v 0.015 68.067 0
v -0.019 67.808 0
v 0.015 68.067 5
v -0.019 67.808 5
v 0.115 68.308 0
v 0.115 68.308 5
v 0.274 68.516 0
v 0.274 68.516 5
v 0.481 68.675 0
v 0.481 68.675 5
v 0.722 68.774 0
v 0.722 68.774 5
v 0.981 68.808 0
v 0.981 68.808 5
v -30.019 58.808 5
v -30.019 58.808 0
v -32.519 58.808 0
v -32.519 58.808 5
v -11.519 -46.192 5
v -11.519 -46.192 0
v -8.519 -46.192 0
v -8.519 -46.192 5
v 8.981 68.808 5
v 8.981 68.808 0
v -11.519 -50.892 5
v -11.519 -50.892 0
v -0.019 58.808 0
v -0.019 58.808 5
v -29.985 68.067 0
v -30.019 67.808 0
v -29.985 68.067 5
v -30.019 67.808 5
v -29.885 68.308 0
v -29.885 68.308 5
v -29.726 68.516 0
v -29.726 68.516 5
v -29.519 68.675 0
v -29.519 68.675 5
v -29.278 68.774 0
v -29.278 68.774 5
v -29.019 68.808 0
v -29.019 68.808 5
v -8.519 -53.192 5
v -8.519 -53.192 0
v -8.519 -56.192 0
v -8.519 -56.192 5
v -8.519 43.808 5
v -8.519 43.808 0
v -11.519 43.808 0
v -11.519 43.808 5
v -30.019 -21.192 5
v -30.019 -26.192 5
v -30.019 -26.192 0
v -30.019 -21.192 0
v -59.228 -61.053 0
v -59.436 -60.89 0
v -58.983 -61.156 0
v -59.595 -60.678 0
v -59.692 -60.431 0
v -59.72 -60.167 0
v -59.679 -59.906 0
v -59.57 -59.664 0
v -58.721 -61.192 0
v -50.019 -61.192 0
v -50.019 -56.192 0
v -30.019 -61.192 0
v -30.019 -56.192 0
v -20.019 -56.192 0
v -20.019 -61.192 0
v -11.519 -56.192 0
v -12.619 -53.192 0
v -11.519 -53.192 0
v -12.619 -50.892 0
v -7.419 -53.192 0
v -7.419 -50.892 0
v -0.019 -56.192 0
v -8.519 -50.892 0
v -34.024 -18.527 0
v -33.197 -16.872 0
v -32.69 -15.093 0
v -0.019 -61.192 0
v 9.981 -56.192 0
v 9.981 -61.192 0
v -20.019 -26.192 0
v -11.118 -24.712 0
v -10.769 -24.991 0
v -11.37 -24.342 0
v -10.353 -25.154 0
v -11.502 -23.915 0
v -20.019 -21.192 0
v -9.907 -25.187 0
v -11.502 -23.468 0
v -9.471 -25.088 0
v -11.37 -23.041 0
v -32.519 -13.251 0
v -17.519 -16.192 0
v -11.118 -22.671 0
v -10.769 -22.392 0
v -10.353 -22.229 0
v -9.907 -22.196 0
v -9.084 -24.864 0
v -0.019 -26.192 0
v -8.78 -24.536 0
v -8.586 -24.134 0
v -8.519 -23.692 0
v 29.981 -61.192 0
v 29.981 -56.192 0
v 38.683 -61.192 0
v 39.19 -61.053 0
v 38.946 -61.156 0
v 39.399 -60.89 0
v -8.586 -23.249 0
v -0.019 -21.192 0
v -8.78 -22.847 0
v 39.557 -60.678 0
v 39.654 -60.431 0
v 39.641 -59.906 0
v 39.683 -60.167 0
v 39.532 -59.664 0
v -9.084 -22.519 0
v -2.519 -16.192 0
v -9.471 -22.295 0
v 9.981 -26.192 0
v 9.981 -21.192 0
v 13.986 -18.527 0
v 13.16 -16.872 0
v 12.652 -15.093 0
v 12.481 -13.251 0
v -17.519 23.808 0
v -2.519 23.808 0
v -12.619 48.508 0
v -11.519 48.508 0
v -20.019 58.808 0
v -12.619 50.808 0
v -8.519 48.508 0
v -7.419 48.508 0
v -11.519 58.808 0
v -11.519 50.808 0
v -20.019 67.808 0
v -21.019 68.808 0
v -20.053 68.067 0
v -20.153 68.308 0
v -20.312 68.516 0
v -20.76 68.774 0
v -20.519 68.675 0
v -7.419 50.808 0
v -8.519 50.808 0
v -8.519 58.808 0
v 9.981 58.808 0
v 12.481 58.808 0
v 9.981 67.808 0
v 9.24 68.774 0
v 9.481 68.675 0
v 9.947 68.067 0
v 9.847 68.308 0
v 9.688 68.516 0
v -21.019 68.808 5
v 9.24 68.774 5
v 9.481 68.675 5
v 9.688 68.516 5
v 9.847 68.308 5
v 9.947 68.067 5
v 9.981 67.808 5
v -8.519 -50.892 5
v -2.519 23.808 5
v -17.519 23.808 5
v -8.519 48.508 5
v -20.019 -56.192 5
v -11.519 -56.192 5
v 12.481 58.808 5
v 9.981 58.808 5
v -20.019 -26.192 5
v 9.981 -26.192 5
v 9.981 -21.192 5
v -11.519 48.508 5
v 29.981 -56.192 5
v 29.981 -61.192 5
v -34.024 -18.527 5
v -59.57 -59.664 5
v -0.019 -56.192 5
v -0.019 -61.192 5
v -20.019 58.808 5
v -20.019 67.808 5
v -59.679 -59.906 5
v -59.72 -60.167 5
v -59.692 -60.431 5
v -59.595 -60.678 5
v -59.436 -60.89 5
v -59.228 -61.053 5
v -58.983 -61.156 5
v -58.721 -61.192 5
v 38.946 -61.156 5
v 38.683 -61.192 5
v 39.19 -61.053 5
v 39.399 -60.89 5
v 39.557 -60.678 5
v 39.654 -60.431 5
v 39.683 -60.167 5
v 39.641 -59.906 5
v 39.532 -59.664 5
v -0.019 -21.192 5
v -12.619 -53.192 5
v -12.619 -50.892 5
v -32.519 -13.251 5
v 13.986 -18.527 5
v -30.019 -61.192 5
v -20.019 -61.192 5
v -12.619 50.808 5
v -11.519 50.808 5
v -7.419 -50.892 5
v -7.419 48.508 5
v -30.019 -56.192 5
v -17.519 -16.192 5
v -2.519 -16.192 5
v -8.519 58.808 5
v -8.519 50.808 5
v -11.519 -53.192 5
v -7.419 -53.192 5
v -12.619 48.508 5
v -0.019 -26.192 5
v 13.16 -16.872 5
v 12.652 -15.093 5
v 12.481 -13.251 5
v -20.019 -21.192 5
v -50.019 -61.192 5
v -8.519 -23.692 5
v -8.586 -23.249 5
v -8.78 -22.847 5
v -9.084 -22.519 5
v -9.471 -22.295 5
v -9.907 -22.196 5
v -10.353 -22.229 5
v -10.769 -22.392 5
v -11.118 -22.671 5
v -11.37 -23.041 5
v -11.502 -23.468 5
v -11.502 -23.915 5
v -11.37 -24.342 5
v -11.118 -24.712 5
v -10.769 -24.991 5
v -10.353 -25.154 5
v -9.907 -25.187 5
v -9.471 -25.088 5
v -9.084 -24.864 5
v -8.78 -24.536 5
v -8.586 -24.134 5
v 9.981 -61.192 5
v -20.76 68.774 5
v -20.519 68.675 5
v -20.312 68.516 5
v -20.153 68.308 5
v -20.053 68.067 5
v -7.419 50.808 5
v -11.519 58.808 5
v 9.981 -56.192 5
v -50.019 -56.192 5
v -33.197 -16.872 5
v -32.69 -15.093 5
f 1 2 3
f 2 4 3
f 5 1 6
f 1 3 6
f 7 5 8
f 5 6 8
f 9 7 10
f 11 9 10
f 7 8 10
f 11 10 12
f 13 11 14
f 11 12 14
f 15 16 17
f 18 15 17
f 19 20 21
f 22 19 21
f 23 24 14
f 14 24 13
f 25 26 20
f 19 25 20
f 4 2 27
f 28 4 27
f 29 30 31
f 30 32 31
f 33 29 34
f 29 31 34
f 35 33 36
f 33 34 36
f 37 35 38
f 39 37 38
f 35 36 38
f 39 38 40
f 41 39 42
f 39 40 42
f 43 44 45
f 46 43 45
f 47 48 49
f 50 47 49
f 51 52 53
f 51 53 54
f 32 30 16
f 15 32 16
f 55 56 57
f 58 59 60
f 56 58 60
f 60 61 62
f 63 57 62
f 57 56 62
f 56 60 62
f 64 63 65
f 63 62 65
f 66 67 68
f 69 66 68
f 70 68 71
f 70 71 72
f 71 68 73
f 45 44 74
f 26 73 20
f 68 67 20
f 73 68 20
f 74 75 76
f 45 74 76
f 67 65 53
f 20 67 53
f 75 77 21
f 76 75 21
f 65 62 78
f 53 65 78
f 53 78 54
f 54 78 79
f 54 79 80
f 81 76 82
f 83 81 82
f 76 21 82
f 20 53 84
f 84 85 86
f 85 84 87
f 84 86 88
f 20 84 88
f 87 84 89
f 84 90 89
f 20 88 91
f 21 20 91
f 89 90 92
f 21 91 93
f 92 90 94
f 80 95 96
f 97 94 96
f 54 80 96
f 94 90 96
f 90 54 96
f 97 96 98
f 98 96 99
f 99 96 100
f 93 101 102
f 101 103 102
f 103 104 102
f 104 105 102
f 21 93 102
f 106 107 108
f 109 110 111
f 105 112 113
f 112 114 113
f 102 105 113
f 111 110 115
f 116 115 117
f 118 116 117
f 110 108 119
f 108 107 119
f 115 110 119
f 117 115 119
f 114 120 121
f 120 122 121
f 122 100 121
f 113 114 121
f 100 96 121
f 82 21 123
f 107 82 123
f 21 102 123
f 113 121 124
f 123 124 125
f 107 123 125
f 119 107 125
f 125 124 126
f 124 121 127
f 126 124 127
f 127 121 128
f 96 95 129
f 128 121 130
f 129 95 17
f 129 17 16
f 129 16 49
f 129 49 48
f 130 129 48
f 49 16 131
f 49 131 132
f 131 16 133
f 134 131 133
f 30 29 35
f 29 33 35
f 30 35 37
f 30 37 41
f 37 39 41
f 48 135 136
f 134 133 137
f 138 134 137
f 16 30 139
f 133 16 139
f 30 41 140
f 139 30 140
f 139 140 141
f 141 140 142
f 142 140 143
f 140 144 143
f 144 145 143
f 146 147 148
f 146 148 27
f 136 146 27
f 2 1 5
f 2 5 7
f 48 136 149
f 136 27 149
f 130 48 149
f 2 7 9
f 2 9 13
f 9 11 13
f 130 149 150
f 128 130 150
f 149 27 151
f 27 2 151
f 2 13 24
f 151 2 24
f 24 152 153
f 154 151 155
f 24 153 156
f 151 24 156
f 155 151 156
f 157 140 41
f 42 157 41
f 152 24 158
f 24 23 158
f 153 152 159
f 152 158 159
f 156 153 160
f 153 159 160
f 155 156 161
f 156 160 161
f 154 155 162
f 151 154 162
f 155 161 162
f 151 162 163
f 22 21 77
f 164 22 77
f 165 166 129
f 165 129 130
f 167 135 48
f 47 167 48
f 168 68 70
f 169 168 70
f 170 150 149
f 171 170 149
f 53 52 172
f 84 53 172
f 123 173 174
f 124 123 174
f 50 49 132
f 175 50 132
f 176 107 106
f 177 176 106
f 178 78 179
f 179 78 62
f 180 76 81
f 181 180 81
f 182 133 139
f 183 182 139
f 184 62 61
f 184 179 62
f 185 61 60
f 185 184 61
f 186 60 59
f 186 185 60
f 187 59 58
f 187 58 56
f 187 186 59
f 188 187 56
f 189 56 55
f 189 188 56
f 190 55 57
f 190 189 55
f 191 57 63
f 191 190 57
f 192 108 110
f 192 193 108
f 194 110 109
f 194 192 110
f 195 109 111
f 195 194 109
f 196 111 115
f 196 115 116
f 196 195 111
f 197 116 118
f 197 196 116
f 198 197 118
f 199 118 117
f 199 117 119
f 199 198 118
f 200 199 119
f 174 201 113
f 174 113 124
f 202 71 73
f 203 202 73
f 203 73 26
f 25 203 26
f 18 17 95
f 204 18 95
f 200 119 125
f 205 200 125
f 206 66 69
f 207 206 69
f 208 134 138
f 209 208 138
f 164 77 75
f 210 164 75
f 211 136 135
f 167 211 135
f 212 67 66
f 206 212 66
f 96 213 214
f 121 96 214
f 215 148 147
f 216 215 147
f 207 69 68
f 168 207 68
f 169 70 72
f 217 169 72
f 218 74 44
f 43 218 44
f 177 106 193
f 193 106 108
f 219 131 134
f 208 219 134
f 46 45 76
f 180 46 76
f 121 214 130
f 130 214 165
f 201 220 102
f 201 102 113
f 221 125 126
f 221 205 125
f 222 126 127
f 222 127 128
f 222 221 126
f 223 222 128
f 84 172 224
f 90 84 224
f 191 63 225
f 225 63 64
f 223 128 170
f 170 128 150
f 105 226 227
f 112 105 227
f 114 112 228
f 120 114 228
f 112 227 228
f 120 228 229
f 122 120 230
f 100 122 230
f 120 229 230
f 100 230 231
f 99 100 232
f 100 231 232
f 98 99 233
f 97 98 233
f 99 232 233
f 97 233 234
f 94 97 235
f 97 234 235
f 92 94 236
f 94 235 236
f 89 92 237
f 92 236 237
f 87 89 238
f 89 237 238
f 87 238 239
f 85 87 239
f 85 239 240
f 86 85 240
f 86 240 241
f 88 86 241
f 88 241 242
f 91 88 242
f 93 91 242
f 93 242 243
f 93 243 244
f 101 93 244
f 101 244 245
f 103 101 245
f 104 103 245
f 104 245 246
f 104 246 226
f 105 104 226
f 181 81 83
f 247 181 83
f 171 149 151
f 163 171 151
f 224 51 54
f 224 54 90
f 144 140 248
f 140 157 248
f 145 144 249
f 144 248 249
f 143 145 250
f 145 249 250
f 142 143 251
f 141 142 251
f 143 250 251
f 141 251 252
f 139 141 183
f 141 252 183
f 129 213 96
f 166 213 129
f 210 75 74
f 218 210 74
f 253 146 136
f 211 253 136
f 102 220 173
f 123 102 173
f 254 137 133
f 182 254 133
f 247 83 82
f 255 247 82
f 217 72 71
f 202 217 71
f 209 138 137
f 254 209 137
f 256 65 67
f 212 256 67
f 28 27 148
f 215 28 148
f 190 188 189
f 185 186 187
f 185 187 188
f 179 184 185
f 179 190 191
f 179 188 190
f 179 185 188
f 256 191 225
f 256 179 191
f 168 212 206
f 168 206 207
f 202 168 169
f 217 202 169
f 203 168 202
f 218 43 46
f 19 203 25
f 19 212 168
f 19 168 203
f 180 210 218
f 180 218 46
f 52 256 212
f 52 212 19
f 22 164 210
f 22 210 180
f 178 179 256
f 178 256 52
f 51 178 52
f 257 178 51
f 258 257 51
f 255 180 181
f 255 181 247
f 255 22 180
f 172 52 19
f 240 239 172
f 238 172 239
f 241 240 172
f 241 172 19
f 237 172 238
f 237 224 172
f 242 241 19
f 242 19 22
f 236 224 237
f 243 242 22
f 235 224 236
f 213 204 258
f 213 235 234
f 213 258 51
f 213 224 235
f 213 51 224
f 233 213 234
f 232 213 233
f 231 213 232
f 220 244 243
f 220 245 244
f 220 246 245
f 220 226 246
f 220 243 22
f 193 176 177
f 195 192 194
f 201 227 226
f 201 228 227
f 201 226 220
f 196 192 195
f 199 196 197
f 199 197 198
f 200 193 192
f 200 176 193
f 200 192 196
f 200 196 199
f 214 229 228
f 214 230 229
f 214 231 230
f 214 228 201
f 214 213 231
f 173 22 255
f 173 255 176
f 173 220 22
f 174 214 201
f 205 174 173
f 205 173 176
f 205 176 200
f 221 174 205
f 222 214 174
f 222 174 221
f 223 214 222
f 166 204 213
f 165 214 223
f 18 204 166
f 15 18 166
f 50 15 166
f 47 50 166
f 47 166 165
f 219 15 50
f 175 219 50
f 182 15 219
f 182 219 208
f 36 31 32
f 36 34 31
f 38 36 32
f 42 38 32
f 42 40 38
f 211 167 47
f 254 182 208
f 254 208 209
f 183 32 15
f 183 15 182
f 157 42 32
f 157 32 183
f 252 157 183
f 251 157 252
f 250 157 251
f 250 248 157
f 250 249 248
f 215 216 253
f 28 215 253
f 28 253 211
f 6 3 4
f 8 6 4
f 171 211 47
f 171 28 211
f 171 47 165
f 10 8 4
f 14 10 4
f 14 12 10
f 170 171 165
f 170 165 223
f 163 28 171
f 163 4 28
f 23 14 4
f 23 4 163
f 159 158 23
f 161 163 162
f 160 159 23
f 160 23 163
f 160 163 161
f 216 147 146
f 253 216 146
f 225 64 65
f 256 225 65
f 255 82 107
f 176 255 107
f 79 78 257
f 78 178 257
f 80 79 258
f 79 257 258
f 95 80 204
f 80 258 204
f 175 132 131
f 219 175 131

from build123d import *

# Parameters (mm, degrees)
BOSS_EXTRUDE1_DEPTH = 5
SKETCH2_R           = 1.5
SKETCH2_W           = 10
SKETCH2_H           = 5
SKETCH2_W_2         = 15
SKETCH2_H_2         = 40
CUT_EXTRUDE1_DEPTH  = 10
FILLET1_R           = 10
FILLET2_R           = 1
CONG_1_R            = 1


with BuildPart() as part:
    # Sketch1 → Boss-Extrude1 (new body)
    with BuildSketch(Plane.XY):
        Polygon((-50.018889855, -56.191512275), (-30.018889855, -56.191512275), (-30.018889855, -61.191512275), (-20.018889855, -61.191512275), (-20.018889855, -56.191512275), (-11.518889855, -56.191512275), (-11.518889855, -53.191512275), (-12.618889855, -53.191512275), (-12.618889855, -50.891512275), (-11.518889855, -50.891512275), (-11.518889855, -46.191512275), (-8.518889855, -46.191512275), (-8.518889855, -50.891512275), (-7.418889855, -50.891512275), (-7.418889855, -53.191512275), (-8.518889855, -53.191512275), (-8.518889855, -56.191512275), (-0.018889855, -56.191512275), (-0.018889855, -61.191512275), (9.981110145, -61.191512275), (9.981110145, -56.191512275), (29.981110145, -56.191512275), (29.981110145, -61.191512275), (40.481110145, -61.191512275), (12.481110145, -16.103821473), (12.481110145, 58.808487725), (9.981110145, 58.808487725), (9.981110145, 68.808487725), (-0.018889855, 68.808487725), (-0.018889855, 58.808487725), (-8.518889855, 58.808487725), (-8.518889855, 50.808487725), (-7.418889855, 50.808487725), (-7.418889855, 48.508487725), (-8.518889855, 48.508487725), (-8.518889855, 43.808487725), (-11.518889855, 43.808487725), (-11.518889855, 48.508487725), (-12.618889855, 48.508487725), (-12.618889855, 50.808487725), (-11.518889855, 50.808487725), (-11.518889855, 58.808487725), (-20.018889855, 58.808487725), (-20.018889855, 68.808487725), (-30.018889855, 68.808487725), (-30.018889855, 58.808487725), (-32.518889855, 58.808487725), (-32.518889855, -16.103821473), (-60.518889855, -61.191512275), (-50.018889855, -61.191512275), align=None)
    extrude(amount=BOSS_EXTRUDE1_DEPTH)

    # Sketch2 → Cut-Extrude1 (cut)
    with BuildSketch(Plane.XY.offset(5)):
        with Locations((-10.018889855, -23.691512275)):
            Circle(SKETCH2_R)
        with Locations((-25.018889855, -23.691512275)):
            Rectangle(SKETCH2_W, SKETCH2_H)
        with Locations((4.981110145, -23.691512275)):
            Rectangle(SKETCH2_W, SKETCH2_H)
        with Locations((-10.018889855, 3.808487725)):
            Rectangle(SKETCH2_W_2, SKETCH2_H_2)
    extrude(amount=-CUT_EXTRUDE1_DEPTH, mode=Mode.SUBTRACT)

    # Fillet1
    fillet1_edges = [part.edges().sort_by_distance(p)[0] for p in [
        (-32.518889855, -16.103821473, 2.5),
        (12.481110145, -16.103821473, 2.5),
    ]]
    fillet(fillet1_edges, radius=FILLET1_R)

    # Fillet2
    fillet2_edges = [part.edges().sort_by_distance(p)[0] for p in [
        (40.481110145, -61.191512275, 2.5),
        (-60.518889855, -61.191512275, 2.5),
    ]]
    fillet(fillet2_edges, radius=FILLET2_R)

    # Congé1
    cong_1_edges = [part.edges().sort_by_distance(p)[0] for p in [
        (-30.018889855, 68.808487725, 2.5),
        (-20.018889855, 68.808487725, 2.5),
        (-0.018889855, 68.808487725, 2.5),
        (9.981110145, 68.808487725, 2.5),
    ]]
    fillet(cong_1_edges, radius=CONG_1_R)


solid = part.part
